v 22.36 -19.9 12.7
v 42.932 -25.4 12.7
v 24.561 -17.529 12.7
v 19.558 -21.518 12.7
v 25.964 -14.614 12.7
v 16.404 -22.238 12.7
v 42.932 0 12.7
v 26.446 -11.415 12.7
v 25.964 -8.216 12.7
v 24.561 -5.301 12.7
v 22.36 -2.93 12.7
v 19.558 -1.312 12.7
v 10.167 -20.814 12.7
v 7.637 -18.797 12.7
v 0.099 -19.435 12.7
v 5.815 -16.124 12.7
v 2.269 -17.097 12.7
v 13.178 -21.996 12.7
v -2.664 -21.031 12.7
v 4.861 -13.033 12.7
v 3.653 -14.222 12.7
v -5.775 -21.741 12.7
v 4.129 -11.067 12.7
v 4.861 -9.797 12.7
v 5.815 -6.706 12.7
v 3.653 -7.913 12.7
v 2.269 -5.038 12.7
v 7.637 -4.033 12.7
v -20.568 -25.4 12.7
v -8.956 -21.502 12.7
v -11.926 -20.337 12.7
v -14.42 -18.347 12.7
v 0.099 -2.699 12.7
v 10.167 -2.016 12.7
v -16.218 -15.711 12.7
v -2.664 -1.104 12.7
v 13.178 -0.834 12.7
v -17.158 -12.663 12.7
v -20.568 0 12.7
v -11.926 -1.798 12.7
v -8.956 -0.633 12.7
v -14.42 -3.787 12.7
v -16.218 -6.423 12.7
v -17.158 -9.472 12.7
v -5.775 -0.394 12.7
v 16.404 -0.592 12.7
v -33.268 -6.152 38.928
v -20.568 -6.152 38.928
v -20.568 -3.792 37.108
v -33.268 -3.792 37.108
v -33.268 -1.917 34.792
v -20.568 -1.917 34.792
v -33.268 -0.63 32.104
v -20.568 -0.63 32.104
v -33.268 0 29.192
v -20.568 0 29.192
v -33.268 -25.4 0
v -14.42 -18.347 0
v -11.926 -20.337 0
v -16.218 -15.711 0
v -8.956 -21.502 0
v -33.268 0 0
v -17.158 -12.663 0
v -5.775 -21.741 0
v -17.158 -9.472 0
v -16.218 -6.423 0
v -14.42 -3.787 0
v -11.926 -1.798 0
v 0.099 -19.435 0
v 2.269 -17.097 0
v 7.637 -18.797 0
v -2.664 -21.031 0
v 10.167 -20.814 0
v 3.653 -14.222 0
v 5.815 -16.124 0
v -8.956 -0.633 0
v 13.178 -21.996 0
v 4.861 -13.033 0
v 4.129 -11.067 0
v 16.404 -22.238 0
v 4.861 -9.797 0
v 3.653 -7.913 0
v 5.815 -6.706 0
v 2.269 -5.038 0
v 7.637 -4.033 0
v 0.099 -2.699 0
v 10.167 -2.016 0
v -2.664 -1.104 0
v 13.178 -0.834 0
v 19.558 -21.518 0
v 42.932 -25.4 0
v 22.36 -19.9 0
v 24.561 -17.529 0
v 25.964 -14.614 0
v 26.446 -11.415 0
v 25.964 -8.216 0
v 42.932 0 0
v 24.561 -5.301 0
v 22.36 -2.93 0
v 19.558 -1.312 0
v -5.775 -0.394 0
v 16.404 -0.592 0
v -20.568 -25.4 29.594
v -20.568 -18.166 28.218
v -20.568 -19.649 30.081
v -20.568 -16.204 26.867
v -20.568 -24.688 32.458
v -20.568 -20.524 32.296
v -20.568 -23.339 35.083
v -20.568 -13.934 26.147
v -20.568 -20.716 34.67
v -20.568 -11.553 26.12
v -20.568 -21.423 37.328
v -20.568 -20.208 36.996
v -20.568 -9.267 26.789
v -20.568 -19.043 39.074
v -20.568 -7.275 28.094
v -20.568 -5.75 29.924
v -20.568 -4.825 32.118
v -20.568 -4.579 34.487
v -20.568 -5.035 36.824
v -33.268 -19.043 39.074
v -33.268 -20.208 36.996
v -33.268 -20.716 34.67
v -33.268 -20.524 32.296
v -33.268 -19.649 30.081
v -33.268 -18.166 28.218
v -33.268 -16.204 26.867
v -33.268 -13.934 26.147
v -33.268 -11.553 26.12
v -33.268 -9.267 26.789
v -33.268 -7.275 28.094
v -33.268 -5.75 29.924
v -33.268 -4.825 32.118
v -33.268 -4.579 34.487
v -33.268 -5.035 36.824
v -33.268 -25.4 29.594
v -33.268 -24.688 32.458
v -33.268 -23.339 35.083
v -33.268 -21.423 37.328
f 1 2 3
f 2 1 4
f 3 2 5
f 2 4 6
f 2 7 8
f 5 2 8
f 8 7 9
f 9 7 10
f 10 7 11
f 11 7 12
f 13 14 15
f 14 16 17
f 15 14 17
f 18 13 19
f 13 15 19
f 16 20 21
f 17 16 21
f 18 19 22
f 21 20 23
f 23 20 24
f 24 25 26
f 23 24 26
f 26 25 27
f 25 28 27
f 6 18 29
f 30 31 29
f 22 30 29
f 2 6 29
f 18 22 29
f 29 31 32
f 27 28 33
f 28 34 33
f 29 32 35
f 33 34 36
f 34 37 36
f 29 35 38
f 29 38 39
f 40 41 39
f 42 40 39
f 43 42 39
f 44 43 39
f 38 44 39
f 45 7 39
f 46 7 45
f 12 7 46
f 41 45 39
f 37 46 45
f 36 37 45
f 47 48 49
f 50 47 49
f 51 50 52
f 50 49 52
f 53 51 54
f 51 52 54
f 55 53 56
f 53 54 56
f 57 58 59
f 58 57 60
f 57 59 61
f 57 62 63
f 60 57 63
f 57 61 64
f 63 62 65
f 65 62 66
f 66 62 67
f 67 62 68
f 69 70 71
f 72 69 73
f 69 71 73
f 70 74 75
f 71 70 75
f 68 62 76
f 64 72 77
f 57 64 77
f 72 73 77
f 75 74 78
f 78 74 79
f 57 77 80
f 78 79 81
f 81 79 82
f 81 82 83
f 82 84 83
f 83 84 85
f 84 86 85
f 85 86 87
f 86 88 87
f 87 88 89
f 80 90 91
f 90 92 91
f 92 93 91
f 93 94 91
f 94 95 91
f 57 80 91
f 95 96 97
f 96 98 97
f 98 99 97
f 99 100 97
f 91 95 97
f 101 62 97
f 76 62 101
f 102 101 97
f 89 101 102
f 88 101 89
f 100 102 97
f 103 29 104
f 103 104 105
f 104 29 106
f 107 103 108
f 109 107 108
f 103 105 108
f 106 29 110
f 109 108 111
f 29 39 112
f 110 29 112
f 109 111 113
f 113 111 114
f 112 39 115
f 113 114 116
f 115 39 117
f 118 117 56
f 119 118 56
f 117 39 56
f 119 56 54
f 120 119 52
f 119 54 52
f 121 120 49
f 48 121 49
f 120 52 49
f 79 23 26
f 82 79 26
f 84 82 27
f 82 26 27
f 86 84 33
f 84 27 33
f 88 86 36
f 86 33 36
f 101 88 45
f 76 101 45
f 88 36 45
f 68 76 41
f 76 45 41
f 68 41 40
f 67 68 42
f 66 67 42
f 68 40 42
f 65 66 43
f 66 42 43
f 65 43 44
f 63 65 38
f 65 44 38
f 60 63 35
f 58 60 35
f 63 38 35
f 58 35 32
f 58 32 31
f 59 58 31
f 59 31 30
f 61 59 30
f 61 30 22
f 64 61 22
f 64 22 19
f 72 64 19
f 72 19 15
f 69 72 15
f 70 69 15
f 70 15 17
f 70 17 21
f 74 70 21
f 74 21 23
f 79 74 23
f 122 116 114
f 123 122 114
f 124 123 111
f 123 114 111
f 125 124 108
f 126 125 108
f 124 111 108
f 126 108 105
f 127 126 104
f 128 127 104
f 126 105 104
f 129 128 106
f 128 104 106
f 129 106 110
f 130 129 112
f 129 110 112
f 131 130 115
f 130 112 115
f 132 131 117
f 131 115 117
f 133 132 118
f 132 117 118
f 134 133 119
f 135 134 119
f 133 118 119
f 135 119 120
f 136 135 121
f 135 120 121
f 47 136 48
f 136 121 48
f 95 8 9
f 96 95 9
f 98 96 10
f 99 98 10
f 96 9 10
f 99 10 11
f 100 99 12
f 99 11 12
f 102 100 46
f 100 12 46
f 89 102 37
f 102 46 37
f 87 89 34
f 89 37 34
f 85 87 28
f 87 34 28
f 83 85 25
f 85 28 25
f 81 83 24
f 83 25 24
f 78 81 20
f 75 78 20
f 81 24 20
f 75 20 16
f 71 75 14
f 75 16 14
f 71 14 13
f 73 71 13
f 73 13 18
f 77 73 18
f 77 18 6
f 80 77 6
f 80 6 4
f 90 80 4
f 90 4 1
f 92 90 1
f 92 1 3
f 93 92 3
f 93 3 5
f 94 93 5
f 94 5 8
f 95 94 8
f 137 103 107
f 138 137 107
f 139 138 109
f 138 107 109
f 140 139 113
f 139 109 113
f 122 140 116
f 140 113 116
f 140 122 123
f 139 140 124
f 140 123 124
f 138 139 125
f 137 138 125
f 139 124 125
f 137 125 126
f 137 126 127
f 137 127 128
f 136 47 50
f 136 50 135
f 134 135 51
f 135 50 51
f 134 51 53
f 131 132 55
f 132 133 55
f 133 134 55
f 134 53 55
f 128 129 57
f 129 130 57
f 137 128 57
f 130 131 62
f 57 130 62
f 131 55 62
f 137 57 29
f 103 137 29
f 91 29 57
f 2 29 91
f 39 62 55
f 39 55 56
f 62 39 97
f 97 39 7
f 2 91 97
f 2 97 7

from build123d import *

# Parameters (mm, degrees)
F1_DEPTH = 25.4
F4_DEPTH = 25.4
F6_DEPTH = 25.4
F7_R     = 10.7031711433
F7_R_2   = 10.853136357
F8_DEPTH = 25.4


with BuildPart() as f1:
    # F0 (on Front) → F1 (new body)
    with BuildSketch(Plane.XZ):
        Polygon((-20.5684766621, 44.45), (-33.2684766621, 44.45), (-33.2684766621, 0), (42.9315233379, 0), (42.9315233379, 12.7), (-20.5684766621, 12.7), align=None)
    extrude(amount=F1_DEPTH)

    # F3 (on face) → F4 (cut)
    with BuildSketch(Plane.YZ.offset(-20.5684766621)):
        with BuildLine():
            ThreePointArc((-25.4, 29.5939260799), (-12.5203138917, 40.7445202451), (0, 29.1918666739))
            Line((0, 29.1918666739), (0, 44.45))
            Line((0, 44.45), (-25.4, 44.45))
            Line((-25.4, 44.45), (-25.4, 29.5939260799))
        make_face()
    extrude(amount=-F4_DEPTH, mode=Mode.SUBTRACT)

    # F5 (on face) → F6 (cut)
    with BuildSketch(Plane.YZ.offset(-20.5684766621)):
        with BuildLine():
            ThreePointArc((-6.1516358245, 38.9277270751), (-12.5777297237, 40.7453000896), (-19.0433743714, 39.0738654502))
            ThreePointArc((-19.0433743714, 39.0738654502), (-12.7443611857, 26.0457440008), (-6.1516358245, 38.9277270751))
        make_face()
    extrude(amount=-F6_DEPTH, mode=Mode.SUBTRACT)

    # F7 (on face) → F8 (cut)
    with BuildSketch(Plane.XY.offset(12.7)):
        with Locations((-6.5744994208, -11.0673578456)):
            Circle(F7_R)
        with Locations((15.5932949856, -11.4149535075)):
            Circle(F7_R_2)
    extrude(amount=-F8_DEPTH, mode=Mode.SUBTRACT)


solid = f1.part
